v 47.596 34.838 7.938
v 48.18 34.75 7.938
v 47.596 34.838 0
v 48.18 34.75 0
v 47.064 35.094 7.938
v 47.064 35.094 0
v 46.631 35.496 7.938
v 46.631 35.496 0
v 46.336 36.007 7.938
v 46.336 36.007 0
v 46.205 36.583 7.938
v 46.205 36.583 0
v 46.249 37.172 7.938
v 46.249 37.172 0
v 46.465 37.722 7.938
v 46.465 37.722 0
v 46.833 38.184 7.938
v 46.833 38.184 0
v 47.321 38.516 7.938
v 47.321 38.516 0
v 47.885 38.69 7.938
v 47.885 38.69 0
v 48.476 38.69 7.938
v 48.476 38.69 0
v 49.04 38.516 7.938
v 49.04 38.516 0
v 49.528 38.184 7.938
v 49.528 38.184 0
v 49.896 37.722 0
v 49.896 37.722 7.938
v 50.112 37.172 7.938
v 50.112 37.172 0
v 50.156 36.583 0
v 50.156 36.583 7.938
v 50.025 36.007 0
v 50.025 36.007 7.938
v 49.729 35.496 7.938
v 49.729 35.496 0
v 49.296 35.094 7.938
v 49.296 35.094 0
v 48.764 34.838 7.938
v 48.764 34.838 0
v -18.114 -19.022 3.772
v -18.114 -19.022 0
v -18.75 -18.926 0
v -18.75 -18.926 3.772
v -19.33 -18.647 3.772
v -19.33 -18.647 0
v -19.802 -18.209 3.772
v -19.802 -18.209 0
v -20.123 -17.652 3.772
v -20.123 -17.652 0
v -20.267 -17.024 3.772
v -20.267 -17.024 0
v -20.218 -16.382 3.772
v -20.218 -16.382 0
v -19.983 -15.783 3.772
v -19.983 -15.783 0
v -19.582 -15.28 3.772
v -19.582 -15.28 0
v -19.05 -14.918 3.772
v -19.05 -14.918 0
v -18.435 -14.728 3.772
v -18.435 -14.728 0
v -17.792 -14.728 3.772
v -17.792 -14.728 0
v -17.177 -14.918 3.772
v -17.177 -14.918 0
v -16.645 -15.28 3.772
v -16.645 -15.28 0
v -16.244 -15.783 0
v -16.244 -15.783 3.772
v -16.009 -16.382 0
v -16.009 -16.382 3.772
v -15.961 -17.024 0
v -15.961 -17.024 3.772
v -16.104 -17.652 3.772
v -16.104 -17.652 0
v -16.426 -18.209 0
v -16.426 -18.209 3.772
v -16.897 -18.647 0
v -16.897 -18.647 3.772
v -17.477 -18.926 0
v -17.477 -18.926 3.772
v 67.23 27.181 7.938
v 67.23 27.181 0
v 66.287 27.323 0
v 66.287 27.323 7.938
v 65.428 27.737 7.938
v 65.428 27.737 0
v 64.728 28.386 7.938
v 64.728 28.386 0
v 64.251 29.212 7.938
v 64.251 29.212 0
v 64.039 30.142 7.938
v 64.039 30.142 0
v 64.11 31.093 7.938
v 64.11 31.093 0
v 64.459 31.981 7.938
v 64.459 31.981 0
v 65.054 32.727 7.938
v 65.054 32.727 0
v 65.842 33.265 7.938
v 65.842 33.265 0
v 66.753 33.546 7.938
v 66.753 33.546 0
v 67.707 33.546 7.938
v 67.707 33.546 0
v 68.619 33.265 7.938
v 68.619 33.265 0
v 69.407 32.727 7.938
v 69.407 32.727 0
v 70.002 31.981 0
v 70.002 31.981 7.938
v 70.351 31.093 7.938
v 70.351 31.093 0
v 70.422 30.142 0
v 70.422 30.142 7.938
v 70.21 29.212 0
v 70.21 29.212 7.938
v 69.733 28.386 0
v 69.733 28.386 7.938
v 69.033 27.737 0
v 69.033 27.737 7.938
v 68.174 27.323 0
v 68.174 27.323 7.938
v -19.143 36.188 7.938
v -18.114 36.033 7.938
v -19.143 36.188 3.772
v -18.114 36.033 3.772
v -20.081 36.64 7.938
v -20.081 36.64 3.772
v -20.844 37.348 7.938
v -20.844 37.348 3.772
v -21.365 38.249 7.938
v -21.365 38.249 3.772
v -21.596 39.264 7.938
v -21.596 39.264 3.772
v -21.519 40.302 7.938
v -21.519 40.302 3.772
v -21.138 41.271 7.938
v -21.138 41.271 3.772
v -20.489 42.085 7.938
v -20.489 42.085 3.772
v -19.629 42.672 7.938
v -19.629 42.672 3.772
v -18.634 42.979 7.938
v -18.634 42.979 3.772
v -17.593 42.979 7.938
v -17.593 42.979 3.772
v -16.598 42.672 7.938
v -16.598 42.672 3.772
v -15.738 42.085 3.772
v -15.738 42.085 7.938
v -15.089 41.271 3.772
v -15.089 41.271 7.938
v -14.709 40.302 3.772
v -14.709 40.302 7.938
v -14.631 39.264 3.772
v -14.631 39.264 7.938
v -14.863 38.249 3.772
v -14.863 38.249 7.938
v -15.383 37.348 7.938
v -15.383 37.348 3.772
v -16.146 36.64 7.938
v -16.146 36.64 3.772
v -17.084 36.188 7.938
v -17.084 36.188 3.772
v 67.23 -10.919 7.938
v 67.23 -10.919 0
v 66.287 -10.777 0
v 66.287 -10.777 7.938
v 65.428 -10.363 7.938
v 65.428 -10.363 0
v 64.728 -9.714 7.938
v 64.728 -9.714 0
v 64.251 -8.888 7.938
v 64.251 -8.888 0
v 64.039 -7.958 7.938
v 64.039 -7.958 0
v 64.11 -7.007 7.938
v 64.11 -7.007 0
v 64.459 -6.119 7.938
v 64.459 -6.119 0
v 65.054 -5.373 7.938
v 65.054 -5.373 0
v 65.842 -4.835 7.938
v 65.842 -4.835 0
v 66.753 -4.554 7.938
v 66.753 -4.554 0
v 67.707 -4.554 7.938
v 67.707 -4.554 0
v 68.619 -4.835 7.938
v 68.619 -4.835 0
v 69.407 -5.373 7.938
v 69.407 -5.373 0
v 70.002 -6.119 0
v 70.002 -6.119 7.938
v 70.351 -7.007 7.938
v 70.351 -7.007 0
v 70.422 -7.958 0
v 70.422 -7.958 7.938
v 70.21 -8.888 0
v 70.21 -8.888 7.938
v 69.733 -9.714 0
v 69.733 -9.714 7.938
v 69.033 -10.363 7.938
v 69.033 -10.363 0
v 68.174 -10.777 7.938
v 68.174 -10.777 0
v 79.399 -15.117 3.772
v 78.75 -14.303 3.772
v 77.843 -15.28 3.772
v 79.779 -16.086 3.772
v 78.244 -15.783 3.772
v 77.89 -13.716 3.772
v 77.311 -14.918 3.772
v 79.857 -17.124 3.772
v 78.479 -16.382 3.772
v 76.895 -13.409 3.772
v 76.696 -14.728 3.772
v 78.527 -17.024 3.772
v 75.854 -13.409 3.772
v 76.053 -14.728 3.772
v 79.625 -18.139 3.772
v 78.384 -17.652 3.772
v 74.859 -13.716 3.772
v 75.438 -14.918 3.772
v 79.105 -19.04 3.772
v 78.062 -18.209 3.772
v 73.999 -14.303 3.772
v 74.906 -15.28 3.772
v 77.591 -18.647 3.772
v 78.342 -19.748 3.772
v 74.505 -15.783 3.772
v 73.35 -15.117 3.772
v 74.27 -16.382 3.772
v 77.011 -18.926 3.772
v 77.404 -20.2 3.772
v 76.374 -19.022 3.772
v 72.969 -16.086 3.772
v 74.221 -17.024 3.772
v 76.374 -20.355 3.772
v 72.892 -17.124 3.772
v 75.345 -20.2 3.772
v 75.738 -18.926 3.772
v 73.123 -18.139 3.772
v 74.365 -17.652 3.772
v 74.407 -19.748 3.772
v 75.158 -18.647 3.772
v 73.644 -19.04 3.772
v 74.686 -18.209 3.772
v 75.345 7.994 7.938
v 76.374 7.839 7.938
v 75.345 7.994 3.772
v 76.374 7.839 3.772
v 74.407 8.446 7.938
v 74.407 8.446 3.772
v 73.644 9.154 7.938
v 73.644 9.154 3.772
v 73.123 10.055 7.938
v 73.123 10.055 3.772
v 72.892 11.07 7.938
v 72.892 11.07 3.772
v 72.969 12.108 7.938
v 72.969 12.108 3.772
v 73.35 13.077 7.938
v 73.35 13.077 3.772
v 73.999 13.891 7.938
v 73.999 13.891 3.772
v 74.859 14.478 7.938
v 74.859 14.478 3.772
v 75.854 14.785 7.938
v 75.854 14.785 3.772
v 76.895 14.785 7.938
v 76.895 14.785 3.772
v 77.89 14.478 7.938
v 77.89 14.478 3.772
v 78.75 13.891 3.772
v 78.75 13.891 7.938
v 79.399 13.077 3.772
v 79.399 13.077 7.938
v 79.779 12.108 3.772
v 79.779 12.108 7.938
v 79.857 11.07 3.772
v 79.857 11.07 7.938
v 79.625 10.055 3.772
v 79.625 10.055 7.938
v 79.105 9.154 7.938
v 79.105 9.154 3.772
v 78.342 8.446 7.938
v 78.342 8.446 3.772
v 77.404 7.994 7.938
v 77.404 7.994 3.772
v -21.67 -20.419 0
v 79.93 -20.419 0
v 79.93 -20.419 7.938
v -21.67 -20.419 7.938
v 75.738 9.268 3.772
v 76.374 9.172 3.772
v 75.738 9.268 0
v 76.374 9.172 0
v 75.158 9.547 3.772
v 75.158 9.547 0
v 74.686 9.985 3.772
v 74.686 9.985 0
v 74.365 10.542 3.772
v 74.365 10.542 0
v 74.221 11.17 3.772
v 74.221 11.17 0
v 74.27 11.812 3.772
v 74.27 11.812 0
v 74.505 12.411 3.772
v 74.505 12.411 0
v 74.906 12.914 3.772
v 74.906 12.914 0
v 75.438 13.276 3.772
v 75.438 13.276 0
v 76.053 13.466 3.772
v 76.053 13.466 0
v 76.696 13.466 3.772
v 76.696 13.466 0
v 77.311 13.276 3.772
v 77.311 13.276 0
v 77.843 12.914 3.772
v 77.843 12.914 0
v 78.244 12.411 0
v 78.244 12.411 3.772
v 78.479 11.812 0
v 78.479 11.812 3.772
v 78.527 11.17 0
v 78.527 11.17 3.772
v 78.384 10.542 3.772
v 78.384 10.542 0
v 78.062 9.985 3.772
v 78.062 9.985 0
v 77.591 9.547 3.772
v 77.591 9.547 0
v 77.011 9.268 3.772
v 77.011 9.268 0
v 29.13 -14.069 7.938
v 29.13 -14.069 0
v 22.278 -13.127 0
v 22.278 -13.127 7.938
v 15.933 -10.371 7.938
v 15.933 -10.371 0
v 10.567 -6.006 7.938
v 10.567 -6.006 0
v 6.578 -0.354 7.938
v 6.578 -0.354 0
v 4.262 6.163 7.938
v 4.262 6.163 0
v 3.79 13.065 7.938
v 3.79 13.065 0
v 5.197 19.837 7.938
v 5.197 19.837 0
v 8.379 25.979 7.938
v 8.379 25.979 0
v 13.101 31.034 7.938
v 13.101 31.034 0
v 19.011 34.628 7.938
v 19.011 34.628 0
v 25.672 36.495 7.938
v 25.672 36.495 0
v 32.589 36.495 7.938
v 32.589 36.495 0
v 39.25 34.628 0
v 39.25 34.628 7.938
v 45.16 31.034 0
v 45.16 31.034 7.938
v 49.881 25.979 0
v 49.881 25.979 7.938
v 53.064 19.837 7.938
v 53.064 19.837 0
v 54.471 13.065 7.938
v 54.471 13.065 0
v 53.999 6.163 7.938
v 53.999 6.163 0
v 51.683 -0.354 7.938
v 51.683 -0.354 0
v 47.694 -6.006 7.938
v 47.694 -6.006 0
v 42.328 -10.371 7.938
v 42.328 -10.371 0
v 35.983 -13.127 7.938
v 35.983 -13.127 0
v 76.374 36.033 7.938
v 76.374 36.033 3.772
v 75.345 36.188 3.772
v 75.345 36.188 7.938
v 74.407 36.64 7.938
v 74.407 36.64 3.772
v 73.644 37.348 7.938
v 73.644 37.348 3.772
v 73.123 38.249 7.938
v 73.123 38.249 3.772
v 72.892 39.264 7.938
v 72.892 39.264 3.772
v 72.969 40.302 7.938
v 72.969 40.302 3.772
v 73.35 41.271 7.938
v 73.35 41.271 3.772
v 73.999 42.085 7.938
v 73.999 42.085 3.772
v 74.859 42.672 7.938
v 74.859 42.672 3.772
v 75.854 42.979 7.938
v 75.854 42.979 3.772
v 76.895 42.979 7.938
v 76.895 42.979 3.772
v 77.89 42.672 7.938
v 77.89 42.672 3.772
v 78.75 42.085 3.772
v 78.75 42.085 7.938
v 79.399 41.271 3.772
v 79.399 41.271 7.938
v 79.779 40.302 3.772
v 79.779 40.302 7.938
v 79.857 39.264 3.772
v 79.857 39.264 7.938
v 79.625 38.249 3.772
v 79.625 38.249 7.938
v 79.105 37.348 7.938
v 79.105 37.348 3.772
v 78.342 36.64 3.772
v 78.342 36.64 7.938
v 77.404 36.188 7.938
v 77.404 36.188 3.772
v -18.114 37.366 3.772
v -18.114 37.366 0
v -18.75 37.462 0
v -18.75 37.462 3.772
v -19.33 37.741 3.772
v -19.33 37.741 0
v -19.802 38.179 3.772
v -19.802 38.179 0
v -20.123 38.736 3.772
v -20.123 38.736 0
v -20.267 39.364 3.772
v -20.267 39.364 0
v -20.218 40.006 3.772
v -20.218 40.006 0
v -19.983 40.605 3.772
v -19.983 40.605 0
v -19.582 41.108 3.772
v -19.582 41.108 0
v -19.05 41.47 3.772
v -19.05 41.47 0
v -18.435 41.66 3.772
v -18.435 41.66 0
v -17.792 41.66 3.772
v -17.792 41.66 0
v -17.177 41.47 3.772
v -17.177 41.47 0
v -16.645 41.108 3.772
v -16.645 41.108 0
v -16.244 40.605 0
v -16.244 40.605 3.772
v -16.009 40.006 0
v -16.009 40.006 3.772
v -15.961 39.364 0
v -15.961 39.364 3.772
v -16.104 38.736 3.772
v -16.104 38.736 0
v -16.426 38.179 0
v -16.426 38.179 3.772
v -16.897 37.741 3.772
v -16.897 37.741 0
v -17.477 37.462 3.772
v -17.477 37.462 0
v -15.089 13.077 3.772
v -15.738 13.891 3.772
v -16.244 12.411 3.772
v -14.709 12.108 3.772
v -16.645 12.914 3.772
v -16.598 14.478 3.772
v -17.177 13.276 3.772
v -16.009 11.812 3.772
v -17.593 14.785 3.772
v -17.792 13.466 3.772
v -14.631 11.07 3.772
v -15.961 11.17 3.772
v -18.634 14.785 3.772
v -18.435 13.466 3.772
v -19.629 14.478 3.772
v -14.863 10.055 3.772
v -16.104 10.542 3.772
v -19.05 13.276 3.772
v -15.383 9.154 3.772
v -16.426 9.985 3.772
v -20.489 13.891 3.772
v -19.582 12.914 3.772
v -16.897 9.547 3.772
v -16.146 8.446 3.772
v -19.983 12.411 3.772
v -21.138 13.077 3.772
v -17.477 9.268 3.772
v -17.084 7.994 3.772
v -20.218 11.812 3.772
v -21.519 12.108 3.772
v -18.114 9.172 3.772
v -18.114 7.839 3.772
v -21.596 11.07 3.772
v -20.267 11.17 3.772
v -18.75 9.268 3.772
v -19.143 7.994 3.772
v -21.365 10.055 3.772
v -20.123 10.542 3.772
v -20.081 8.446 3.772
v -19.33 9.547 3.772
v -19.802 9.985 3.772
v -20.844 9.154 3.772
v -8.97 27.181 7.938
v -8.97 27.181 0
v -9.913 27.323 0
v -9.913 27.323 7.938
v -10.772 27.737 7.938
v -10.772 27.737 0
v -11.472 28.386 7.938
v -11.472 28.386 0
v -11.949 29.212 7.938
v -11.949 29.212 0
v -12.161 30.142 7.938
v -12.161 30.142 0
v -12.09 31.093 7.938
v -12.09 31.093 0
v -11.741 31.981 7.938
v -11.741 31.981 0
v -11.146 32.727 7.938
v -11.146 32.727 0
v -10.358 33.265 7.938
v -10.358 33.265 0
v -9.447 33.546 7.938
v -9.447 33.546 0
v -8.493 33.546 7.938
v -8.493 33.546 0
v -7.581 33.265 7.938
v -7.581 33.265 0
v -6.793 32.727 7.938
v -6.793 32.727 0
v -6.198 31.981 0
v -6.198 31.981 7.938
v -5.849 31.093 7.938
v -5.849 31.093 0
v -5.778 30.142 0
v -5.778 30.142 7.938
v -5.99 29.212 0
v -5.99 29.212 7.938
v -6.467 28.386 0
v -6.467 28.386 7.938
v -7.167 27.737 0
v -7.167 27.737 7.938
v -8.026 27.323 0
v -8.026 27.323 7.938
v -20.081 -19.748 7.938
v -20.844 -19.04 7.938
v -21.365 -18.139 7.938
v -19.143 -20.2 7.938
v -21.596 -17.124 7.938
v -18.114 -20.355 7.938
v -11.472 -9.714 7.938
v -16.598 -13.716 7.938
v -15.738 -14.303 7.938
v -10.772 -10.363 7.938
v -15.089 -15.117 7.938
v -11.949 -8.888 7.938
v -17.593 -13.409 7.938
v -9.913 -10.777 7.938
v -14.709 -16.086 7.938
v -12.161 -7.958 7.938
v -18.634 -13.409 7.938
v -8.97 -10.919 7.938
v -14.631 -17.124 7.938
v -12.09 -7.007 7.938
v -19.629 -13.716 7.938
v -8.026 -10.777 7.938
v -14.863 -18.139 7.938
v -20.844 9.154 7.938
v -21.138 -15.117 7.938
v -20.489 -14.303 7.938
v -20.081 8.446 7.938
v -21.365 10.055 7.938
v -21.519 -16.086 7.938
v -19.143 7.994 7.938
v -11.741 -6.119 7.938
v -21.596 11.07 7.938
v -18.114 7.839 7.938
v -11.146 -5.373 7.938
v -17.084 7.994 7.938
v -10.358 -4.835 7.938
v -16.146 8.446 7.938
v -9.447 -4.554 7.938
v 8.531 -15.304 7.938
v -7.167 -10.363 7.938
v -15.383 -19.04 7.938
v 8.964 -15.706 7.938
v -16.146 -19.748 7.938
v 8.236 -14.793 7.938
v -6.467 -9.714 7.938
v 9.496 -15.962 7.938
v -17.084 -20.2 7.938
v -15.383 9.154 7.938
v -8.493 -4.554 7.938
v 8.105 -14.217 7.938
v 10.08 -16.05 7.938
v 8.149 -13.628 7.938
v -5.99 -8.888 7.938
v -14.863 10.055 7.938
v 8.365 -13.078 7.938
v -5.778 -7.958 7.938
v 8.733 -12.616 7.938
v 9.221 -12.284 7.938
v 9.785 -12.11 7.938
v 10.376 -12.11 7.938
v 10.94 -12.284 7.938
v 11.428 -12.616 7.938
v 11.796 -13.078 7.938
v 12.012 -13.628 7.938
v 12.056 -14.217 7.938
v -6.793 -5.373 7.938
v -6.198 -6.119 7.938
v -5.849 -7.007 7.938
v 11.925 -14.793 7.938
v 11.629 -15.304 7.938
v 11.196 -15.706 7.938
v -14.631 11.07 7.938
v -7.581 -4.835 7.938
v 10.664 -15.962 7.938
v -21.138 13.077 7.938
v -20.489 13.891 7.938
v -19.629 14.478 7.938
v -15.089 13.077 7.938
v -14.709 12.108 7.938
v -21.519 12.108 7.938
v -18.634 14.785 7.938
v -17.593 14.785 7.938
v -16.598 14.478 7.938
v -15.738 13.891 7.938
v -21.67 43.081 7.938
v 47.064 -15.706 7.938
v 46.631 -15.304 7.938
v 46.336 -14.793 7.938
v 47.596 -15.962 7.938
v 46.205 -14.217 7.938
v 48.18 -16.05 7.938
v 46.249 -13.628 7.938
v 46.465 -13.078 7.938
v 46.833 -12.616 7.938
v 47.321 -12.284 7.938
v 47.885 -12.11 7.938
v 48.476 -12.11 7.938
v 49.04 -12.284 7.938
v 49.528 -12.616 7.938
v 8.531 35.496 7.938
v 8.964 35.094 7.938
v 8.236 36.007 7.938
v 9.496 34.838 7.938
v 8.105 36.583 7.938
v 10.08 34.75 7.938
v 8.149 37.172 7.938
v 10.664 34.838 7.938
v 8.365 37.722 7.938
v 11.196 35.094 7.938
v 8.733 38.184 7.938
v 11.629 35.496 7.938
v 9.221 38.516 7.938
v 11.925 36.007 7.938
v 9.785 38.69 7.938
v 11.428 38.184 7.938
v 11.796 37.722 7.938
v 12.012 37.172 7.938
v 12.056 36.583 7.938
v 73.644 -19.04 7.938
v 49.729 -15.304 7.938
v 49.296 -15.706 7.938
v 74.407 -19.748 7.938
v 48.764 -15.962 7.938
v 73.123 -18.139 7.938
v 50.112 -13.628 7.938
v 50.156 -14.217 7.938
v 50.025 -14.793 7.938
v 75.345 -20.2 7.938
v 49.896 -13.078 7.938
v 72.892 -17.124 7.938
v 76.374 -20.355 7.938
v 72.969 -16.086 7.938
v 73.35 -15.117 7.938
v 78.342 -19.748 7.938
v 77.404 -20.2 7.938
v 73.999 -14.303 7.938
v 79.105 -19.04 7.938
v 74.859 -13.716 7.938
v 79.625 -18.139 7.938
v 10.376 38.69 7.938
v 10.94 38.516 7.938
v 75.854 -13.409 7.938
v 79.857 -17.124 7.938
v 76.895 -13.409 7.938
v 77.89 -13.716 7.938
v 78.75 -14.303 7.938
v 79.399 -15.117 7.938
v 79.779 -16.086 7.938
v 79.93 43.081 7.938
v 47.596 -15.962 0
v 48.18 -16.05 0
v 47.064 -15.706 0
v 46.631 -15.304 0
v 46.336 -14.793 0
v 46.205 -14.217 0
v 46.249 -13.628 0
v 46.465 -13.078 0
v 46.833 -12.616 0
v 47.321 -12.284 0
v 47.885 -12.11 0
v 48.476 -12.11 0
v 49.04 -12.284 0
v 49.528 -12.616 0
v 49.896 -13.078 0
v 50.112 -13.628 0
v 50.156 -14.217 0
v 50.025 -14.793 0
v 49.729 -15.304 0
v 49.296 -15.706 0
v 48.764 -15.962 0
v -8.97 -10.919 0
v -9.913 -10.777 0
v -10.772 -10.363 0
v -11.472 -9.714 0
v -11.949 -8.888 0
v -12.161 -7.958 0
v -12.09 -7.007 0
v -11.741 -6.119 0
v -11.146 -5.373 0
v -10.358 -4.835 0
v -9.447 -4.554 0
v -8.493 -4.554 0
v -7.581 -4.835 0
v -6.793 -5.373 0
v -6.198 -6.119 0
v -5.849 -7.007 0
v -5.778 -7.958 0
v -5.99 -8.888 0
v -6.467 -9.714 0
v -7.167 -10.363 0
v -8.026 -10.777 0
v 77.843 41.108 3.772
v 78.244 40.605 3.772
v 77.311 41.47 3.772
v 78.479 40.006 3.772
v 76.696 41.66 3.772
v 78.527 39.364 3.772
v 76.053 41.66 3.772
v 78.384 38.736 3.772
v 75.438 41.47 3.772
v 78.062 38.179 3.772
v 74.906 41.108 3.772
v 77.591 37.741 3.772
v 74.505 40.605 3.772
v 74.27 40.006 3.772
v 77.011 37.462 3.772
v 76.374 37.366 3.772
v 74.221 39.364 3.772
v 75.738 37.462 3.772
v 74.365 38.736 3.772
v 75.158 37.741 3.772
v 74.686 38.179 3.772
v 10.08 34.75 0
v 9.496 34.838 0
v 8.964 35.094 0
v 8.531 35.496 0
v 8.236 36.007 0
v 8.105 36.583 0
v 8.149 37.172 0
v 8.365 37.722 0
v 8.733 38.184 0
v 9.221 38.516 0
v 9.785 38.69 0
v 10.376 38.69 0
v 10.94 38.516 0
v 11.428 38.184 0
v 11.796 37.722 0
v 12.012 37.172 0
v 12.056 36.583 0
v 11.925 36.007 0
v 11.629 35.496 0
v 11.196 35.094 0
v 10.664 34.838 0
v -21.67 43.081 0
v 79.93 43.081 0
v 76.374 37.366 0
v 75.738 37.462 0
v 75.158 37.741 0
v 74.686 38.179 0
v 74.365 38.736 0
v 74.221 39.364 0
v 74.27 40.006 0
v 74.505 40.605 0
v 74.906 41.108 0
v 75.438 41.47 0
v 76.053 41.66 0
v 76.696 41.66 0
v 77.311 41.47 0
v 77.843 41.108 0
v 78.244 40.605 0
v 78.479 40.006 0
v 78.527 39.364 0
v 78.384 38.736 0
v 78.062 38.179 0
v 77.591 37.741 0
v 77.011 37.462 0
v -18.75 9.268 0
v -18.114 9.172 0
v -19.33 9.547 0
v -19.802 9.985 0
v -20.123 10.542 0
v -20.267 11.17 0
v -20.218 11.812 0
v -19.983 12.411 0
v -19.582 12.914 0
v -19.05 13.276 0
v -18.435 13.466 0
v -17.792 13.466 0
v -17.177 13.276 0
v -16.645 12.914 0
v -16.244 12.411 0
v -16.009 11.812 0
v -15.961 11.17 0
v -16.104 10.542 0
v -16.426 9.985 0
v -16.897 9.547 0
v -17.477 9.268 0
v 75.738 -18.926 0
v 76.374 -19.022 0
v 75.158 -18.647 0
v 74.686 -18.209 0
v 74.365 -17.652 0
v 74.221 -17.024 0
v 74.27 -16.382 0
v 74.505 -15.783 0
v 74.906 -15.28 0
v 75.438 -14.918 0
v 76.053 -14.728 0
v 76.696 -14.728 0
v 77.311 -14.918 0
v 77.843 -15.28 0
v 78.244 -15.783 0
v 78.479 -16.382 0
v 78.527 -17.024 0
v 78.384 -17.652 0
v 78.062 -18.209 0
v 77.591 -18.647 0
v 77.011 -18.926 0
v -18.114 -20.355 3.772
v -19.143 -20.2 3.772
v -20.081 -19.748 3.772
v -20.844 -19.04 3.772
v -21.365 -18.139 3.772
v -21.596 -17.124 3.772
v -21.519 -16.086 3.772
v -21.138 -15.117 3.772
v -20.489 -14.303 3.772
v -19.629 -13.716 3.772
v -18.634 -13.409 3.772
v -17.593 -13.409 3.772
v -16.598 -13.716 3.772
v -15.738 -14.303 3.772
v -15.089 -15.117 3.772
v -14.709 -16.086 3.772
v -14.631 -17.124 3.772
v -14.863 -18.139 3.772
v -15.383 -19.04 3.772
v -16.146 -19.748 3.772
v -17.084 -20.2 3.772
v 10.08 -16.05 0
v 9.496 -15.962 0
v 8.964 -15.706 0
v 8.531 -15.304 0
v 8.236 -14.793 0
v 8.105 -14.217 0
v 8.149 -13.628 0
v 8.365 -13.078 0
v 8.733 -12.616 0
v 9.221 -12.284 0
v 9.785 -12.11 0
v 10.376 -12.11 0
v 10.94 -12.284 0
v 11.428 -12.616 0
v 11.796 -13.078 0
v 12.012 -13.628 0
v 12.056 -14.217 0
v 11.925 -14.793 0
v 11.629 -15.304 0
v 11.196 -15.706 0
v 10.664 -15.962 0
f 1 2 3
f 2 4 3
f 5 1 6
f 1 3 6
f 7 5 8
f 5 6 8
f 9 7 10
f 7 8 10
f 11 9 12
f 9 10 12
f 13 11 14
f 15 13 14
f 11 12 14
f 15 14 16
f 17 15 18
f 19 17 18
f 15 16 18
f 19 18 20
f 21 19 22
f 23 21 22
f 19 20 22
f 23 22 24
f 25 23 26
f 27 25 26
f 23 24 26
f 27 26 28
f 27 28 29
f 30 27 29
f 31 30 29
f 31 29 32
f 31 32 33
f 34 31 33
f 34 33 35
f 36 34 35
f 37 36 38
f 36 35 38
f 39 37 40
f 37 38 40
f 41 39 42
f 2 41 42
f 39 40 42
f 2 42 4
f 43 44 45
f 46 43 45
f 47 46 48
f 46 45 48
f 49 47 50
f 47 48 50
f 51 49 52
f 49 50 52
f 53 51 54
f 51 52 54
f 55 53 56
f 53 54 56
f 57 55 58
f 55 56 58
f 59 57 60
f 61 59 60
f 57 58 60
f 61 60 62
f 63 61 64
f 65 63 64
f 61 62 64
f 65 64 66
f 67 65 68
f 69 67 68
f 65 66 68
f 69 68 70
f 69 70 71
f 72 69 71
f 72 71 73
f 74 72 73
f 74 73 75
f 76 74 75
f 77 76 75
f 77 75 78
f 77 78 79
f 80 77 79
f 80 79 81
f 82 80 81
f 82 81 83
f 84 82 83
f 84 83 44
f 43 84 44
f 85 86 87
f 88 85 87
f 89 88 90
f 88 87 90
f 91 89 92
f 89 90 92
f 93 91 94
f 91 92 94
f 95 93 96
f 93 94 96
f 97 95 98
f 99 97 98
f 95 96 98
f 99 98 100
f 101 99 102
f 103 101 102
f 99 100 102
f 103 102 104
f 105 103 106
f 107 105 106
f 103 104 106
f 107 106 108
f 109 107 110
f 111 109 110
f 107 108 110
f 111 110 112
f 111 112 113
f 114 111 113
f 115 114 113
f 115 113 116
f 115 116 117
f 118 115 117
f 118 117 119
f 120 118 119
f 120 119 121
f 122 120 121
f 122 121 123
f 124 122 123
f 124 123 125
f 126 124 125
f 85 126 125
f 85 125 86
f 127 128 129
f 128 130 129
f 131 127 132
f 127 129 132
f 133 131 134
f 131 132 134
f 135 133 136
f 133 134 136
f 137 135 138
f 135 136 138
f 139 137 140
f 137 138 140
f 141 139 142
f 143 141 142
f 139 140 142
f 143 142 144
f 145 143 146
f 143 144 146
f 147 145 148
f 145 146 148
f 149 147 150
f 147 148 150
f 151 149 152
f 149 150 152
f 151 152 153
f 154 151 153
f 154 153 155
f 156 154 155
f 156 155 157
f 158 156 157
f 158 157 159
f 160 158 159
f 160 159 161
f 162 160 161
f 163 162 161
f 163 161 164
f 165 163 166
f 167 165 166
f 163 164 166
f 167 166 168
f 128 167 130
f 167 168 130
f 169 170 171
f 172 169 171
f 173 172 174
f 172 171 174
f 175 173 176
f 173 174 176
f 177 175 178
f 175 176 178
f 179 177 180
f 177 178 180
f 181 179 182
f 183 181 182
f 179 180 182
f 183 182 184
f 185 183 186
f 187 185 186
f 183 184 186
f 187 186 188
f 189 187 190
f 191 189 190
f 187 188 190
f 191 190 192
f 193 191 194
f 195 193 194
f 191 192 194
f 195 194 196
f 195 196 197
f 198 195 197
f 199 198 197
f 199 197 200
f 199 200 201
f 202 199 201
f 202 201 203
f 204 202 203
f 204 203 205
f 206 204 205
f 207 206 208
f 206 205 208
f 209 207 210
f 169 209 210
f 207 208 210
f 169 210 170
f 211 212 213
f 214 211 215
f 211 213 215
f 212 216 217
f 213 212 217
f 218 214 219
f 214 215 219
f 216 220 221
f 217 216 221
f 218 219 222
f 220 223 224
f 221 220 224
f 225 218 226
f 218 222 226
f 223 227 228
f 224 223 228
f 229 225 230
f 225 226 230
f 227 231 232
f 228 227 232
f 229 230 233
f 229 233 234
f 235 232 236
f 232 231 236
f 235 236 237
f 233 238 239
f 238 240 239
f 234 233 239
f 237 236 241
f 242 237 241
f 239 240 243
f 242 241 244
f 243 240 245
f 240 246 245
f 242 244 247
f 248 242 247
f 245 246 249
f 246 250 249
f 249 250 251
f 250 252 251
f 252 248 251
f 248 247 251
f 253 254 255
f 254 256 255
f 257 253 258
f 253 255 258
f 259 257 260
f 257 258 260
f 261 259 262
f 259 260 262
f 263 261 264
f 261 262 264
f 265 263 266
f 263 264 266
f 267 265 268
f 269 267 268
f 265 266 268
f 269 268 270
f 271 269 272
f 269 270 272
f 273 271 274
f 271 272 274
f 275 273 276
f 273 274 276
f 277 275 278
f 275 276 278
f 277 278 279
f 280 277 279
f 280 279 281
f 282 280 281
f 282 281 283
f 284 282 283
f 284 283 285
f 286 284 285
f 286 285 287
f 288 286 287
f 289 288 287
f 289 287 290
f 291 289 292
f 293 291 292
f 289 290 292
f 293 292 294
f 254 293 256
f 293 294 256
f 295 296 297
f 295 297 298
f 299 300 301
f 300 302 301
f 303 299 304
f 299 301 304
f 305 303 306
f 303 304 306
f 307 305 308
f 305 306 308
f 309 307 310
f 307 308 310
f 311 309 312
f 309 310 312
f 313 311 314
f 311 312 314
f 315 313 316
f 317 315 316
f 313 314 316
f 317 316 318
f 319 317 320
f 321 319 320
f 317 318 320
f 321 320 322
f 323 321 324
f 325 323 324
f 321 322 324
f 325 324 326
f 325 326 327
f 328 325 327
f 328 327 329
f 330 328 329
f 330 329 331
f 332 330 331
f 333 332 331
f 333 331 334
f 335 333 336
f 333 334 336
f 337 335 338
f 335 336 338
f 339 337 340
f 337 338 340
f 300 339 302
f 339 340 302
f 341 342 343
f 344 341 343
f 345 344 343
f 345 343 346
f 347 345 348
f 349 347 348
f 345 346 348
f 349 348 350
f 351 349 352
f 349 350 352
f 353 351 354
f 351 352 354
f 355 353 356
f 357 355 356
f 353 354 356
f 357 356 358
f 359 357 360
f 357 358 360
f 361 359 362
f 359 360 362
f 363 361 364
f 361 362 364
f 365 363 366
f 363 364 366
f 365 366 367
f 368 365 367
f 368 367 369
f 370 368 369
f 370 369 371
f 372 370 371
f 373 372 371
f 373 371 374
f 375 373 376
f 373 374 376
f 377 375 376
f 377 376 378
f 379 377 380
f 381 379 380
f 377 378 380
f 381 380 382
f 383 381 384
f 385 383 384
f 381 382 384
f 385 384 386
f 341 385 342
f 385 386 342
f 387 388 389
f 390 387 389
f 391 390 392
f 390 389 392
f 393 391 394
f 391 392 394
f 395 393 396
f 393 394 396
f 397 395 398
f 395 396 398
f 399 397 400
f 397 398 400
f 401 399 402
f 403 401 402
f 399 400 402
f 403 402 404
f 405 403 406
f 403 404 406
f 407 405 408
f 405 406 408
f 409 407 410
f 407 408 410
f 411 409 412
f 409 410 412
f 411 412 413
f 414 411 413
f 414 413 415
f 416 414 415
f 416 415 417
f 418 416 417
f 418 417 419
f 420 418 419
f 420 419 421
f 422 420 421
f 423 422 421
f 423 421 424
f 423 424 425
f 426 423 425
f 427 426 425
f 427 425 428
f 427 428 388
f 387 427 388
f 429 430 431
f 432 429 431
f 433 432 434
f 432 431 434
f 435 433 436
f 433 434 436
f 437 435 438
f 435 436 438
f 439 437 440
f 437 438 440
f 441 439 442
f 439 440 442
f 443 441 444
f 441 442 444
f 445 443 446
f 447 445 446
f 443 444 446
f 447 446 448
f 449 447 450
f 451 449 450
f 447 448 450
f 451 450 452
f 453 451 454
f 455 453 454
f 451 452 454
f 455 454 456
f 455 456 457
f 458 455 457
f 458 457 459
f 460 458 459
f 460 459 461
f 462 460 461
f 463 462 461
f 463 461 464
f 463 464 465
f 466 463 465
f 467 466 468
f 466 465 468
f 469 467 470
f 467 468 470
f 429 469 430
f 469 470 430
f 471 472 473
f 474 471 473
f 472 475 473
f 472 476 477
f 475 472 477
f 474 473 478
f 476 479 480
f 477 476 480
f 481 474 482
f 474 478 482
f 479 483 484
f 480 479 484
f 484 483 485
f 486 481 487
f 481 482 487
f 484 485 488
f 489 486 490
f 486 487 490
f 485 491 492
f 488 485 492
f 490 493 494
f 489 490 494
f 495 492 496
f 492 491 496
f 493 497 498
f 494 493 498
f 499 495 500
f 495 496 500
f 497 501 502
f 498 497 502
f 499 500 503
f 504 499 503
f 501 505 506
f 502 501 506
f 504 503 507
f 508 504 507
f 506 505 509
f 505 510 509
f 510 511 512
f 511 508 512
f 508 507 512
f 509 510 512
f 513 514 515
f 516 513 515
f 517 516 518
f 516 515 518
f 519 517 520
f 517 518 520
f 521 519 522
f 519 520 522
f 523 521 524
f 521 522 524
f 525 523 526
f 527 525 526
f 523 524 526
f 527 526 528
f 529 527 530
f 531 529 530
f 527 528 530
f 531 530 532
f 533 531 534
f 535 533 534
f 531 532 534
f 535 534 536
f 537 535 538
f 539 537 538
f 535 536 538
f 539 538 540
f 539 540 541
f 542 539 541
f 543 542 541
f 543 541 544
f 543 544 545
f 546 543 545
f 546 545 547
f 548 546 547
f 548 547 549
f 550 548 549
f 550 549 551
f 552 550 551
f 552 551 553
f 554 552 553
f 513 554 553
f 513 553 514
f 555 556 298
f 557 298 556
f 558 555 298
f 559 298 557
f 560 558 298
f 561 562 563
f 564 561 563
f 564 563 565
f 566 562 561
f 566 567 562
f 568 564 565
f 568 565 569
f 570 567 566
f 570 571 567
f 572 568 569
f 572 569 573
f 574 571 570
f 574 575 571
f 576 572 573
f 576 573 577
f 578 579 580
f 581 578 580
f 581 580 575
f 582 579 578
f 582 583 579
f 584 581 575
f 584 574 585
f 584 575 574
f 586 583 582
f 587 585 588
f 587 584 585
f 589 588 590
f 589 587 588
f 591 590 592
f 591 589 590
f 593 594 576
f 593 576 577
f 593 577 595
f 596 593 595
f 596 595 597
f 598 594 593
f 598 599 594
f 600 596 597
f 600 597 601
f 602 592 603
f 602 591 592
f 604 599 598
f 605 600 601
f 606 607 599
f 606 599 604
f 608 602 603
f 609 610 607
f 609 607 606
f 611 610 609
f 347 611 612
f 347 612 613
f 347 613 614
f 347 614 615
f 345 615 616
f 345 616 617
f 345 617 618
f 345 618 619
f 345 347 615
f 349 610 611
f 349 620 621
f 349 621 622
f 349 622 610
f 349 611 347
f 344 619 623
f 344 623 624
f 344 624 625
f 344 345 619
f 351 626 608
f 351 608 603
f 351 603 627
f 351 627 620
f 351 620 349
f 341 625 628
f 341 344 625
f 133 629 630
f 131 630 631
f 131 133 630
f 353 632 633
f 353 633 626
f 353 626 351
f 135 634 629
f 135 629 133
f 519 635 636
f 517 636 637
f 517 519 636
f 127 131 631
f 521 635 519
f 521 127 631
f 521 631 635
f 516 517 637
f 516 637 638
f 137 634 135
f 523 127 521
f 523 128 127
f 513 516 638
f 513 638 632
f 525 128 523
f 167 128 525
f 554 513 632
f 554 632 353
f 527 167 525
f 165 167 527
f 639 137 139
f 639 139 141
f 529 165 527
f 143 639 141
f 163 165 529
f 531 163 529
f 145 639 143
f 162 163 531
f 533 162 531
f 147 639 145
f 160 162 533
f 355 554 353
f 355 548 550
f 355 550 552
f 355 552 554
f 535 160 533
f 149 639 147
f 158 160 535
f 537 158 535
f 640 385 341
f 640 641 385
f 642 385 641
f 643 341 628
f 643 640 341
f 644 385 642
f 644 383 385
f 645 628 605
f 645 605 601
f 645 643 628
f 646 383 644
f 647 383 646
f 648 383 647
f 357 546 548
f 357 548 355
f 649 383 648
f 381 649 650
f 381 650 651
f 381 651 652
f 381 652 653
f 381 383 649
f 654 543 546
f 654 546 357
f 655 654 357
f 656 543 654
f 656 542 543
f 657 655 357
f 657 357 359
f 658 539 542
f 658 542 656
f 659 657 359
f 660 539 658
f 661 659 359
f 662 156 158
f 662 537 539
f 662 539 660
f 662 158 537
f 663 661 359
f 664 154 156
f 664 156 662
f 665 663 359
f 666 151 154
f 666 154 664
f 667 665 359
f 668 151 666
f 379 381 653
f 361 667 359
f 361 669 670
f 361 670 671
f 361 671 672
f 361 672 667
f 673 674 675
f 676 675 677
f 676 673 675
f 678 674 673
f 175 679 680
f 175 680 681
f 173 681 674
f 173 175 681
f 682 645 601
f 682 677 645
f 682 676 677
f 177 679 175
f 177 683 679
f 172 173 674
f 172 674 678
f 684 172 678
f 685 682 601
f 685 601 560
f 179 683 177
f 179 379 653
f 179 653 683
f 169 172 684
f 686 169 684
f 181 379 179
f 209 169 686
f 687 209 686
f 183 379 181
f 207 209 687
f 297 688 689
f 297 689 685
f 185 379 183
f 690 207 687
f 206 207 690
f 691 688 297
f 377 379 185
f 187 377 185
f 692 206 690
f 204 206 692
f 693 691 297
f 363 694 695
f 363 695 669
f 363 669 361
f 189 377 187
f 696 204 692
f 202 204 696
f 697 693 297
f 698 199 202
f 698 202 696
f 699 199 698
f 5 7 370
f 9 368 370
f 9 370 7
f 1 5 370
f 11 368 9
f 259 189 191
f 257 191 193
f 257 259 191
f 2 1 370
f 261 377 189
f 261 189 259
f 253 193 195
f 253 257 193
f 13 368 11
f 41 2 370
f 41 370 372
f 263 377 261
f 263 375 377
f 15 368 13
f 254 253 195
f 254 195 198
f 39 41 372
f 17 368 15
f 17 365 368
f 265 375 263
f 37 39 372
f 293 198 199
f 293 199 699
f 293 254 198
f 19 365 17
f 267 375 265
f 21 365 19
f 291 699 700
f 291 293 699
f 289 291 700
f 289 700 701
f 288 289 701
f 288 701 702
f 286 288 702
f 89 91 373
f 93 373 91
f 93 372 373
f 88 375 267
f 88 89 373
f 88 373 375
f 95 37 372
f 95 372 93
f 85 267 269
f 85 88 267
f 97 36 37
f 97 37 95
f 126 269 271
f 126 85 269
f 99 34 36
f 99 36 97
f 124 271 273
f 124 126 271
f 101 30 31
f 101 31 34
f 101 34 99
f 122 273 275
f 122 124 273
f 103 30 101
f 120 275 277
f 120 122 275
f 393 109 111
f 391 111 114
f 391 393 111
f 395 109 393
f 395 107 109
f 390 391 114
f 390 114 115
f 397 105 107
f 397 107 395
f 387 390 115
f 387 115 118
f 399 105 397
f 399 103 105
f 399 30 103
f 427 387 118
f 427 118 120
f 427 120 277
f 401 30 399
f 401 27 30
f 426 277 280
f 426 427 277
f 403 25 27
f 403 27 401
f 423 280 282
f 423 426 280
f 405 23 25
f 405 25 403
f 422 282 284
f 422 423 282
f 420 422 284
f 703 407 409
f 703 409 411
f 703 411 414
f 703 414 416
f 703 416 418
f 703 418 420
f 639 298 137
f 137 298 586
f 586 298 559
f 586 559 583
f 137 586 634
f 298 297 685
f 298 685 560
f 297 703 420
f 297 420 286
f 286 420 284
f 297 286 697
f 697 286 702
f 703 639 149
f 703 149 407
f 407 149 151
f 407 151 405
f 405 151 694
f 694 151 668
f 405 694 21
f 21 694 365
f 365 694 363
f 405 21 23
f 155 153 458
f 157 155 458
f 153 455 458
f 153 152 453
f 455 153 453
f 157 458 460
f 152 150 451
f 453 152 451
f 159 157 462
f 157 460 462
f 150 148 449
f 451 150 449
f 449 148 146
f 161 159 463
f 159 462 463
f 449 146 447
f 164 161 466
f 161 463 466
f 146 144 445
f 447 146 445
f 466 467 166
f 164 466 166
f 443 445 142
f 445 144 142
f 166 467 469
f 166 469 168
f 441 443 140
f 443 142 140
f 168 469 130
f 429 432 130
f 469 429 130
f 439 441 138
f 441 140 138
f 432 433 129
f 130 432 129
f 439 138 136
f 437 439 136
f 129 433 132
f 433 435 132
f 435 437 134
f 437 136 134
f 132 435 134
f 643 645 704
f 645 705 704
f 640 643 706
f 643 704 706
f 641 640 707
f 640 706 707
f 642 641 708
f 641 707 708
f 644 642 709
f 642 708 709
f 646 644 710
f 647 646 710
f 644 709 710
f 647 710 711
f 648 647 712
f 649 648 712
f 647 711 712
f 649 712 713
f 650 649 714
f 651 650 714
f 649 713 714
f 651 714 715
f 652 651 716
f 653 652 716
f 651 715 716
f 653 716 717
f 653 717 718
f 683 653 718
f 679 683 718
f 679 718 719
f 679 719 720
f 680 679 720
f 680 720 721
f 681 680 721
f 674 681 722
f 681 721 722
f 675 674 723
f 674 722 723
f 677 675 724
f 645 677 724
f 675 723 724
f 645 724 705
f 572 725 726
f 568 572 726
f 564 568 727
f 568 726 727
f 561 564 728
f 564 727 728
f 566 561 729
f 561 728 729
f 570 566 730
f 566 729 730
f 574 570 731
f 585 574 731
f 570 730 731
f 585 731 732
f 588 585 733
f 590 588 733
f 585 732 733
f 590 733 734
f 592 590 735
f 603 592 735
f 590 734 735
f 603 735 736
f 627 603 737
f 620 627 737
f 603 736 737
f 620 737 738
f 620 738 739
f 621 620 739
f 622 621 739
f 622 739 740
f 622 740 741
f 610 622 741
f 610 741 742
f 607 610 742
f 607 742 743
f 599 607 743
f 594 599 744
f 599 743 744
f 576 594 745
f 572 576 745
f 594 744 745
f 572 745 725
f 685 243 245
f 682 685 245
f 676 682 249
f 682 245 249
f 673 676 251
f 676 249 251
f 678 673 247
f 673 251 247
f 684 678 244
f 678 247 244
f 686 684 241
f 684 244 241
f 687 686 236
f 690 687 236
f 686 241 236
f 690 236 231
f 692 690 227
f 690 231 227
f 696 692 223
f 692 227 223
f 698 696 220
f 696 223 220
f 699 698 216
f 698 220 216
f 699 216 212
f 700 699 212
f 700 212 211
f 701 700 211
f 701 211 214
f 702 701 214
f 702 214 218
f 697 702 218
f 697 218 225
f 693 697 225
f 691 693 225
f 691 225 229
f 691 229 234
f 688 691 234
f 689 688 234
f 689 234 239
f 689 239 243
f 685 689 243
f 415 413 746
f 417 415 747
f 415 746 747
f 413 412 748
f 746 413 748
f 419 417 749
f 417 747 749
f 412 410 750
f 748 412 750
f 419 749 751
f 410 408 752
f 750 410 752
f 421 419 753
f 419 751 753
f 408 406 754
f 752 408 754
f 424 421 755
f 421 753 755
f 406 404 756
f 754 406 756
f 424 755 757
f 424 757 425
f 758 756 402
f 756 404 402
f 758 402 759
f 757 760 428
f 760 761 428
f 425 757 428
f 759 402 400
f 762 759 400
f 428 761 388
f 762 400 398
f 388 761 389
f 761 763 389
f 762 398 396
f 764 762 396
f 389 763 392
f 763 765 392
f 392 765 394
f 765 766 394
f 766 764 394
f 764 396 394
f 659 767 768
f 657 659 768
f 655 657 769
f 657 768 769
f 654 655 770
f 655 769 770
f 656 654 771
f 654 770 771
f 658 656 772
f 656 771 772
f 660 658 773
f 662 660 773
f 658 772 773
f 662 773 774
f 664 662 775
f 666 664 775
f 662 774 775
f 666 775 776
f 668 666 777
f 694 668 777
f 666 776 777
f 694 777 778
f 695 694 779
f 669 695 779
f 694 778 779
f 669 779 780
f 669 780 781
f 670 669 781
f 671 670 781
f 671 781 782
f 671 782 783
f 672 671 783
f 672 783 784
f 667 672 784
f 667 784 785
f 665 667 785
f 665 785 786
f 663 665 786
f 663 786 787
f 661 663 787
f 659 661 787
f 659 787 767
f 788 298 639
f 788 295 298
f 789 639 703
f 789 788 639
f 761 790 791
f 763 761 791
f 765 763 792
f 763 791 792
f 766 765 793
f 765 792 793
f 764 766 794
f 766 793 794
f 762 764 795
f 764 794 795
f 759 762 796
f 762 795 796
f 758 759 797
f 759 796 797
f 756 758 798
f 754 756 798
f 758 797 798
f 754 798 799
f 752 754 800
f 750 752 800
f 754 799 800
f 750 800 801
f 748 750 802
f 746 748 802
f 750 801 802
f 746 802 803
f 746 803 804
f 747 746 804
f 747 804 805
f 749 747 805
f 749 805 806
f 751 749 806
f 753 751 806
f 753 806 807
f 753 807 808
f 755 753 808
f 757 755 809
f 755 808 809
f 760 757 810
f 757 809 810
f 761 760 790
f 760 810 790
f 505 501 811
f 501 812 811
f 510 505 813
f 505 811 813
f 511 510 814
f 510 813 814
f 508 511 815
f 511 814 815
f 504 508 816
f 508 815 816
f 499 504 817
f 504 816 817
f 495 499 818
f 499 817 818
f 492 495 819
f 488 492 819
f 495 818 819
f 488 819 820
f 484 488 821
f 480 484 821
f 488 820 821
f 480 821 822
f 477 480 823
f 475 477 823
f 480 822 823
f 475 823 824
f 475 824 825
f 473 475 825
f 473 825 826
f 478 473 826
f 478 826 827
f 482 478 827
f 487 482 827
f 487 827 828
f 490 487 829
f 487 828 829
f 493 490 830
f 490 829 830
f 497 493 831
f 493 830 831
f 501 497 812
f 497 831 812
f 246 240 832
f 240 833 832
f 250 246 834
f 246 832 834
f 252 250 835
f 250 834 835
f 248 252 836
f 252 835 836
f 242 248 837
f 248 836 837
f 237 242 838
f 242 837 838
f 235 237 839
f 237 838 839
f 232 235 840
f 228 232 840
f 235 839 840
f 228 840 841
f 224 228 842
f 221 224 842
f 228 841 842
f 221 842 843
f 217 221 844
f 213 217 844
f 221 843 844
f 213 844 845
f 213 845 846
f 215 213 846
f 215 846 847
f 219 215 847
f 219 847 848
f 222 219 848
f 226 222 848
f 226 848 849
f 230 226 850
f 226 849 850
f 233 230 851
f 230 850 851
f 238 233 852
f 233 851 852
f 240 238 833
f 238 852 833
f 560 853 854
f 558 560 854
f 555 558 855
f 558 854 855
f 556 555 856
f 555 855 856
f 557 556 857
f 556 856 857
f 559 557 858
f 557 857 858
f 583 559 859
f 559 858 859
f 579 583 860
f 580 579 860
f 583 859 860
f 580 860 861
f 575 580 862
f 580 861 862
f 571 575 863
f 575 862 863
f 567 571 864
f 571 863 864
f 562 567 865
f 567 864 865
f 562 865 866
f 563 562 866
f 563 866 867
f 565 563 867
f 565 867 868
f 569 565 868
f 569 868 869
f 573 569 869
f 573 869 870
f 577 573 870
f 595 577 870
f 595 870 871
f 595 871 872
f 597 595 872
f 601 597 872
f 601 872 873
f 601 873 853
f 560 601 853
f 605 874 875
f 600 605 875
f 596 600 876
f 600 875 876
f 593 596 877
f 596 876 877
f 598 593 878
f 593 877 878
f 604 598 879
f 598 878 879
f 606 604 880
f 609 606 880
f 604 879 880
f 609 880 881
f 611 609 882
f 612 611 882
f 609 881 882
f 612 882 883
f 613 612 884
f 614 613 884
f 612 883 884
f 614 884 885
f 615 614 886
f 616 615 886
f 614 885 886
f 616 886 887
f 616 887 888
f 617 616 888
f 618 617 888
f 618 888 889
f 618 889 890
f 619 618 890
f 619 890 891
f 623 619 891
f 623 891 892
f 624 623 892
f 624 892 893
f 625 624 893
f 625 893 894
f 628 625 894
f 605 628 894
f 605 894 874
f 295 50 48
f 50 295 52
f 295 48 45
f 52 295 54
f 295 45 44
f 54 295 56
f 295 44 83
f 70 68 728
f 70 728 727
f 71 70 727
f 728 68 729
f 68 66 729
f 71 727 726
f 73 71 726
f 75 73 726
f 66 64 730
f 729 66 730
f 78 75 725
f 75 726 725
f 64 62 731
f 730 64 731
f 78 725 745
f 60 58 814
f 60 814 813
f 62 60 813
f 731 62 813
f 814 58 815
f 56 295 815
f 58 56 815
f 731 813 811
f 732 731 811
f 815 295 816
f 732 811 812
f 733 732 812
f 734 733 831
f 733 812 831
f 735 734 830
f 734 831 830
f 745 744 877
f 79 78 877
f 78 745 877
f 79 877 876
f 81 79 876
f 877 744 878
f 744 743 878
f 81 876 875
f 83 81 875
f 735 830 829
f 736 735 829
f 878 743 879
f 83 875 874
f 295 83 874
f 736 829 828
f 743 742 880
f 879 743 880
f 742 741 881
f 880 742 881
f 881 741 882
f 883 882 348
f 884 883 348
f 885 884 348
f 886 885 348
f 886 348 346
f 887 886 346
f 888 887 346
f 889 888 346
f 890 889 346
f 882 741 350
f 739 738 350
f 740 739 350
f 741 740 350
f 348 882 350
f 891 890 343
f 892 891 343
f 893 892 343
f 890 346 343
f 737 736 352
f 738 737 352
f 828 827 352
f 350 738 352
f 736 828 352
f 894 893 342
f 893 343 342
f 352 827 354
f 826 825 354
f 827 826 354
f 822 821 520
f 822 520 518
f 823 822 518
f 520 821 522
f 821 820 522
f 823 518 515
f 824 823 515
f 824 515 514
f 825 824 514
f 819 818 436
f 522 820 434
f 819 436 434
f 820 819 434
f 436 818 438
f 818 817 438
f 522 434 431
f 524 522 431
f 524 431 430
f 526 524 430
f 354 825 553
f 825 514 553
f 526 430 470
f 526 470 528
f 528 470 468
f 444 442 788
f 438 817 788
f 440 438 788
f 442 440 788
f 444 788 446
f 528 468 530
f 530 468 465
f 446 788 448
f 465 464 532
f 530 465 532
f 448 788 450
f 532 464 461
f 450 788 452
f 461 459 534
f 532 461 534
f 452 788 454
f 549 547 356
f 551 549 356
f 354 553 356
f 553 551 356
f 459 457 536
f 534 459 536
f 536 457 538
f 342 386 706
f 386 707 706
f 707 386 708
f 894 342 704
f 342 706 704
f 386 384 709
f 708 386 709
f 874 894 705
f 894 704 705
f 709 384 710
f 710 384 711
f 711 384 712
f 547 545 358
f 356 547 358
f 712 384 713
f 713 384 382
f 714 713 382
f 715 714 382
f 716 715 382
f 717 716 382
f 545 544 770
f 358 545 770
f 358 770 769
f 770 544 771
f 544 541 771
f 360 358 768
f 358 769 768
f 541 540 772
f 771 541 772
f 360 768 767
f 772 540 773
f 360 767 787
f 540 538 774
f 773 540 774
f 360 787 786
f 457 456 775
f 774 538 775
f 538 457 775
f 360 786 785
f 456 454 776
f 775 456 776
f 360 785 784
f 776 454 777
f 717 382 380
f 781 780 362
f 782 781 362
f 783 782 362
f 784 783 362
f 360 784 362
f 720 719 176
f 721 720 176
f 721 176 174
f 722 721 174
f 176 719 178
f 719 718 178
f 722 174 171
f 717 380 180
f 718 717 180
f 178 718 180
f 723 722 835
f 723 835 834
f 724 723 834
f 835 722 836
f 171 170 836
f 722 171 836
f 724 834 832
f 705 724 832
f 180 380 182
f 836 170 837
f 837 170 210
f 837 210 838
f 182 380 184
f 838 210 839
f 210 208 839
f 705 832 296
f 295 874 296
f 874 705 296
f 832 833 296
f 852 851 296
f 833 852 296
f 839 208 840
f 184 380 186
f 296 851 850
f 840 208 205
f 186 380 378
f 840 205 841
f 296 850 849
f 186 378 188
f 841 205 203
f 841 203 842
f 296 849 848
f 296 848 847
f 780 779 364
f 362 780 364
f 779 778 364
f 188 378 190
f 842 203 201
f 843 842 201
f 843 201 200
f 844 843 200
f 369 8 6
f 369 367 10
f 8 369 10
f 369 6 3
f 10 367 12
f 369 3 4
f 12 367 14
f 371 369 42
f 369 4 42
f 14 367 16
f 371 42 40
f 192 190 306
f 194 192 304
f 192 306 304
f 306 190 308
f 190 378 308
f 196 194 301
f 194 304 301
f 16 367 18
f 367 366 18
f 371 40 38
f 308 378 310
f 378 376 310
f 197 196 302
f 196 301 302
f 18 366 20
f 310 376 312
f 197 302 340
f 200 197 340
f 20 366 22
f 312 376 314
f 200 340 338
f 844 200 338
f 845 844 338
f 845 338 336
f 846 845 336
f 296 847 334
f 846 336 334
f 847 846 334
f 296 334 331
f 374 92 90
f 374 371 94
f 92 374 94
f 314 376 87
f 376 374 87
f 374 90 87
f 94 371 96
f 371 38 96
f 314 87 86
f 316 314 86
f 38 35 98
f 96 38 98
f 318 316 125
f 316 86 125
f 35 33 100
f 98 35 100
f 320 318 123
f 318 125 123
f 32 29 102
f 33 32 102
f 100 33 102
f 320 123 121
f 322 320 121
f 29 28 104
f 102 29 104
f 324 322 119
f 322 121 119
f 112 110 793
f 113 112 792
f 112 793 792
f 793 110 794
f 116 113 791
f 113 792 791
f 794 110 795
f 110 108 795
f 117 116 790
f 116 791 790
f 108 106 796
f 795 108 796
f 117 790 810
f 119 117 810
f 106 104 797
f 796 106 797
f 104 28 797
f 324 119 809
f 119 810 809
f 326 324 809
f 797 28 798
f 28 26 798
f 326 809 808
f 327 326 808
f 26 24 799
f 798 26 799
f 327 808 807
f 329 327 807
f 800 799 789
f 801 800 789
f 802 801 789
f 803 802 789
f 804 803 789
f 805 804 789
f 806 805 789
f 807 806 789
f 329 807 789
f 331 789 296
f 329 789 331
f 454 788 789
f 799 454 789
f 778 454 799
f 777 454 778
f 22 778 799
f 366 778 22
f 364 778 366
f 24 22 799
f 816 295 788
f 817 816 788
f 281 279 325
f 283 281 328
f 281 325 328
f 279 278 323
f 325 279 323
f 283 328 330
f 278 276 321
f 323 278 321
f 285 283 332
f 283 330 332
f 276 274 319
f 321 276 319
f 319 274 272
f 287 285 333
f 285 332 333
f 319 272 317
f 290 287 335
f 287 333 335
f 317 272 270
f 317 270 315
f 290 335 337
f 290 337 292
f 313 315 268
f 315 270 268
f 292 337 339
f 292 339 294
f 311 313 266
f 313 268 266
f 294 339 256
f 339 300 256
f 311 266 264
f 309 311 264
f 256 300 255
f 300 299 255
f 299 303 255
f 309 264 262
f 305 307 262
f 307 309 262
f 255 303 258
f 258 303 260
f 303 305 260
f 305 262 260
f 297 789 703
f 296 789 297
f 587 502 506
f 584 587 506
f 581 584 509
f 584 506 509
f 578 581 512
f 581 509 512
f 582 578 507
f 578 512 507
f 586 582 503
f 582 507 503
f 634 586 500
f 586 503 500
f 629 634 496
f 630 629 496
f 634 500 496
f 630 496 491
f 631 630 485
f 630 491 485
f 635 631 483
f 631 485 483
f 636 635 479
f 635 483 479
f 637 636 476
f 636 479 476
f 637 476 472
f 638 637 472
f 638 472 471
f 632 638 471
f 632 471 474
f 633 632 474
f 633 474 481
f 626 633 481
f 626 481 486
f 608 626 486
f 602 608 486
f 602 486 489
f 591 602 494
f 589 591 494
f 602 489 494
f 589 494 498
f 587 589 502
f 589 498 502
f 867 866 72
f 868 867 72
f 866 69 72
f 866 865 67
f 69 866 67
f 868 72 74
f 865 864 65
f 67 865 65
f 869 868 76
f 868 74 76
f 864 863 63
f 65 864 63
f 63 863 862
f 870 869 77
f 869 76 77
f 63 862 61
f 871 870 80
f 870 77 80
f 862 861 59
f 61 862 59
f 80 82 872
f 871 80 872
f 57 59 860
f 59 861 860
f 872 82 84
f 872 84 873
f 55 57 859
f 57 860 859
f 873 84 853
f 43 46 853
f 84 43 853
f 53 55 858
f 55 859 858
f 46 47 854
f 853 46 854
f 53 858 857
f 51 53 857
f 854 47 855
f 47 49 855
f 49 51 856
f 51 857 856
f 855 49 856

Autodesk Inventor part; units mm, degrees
ref_plane "YZ Plane" through (0, 0, 0) normal (1, 0, 0) x (0, 1, 0)
ref_plane "XZ Plane" through (0, 0, 0) normal (0, 1, 0) x (-1, 0, 0)
ref_plane "XY Plane" through (0, 0, 0) normal (0, 0, 1) x (1, 0, 0)
sketch "Sketch1" plane through (0, 0, 0) normal (0, 0, 1) x (1, 0, 0)
  line L0 (-21.6696, 43.0812) -> (79.9304, 43.0812)
  line L1 (79.9304, 43.0812) -> (79.9304, -20.4188)
  line L2 (79.9304, -20.4188) -> (-21.6696, -20.4188)
  line L3 (-21.6696, -20.4188) -> (-21.6696, 43.0812)
  point P0 (0, 0)
  dimension "d0" = 101.6
  dimension "d1" = 63.5
extrude "Extrusion1" add sketch "Sketch1" along normal blind 7.9375
sketch "Sketch3" plane through (0, 0, 7.9375) normal (0, 0, 1) x (1, 0, 0)
  line L0 (-21.6696, 43.0812) -> (79.9304, 43.0812) projected
  line L1 (-21.6696, -20.4188) -> (-21.6696, 43.0812) projected
  point P0 (0, 0)
  point P1 (29.1304, 11.3312)
  dimension "d15" = 31.75
  dimension "d16" = 50.8
hole "Hole2" at (29.1304, 11.3312, 7.9375) direction (0, 0, -1) diameter 50.8 end through all
sketch "Sketch4" plane through (0, 0, 7.9375) normal (0, 0, 1) x (1, 0, 0)
  line L0 (-21.6696, -20.4188) -> (-21.6696, 43.0812) projected
  line L1 (79.9304, -20.4188) -> (-21.6696, -20.4188) projected
  point P0 (0, 0)
  point P1 (10.0804, 36.7312)
  point P2 (10.0804, -14.0688)
  point P3 (48.1804, 36.7312)
  point P4 (48.1804, -14.0688)
  dimension "d24" = 50.8
  dimension "d25" = 6.35
  dimension "d26" = 38.1
  dimension "d27" = 31.75
  dimension "d28" = 31.75
hole "Hole3" at (10.0804, 36.7312, 7.9375) at (10.0804, -14.0688, 7.9375) at (48.1804, 36.7312, 7.9375) at (48.1804, -14.0688, 7.9375) direction (0, 0, -1) diameter 3.9624 end through all thread size "10-32 UNF" class "2B" standard "ANSI Unified Screw Threads"
sketch "Sketch5" plane through (0, 0, 7.9375) normal (0, 0, 1) x (1, 0, 0)
  line L0 (79.9304, 43.0812) -> (79.9304, -20.4188) projected
  line L1 (-21.6696, 43.0812) -> (79.9304, 43.0812) projected
  line L2 (-21.6696, -20.4188) -> (-21.6696, 43.0812) projected
  line L3 (79.9304, -20.4188) -> (-21.6696, -20.4188) projected
  point P0 (0, 0)
  point P1 (-18.1136, 39.5252)
  point P2 (-18.1136, -16.8628)
  point P3 (76.3744, -16.8628)
  point P4 (76.3744, 39.5252)
  point P5 (-18.1136, 11.3312)
  point P6 (76.3744, 11.3312)
  dimension "d36" = 3.556
  dimension "d37" = 3.556
  dimension "d38" = 3.556
  dimension "d39" = 3.556
  dimension "d47" = 3.556
  dimension "d48" = 3.556
  dimension "d49" = 3.556
  dimension "d50" = 3.556
  dimension "d51" = 3.556
  dimension "d52" = 3.556
  dimension "d66" = 94.488
  dimension "d67" = 56.388
hole "Hole4" at (-18.1136, 39.5252, 7.9375) at (-18.1136, -16.8628, 7.9375) at (76.3744, -16.8628, 7.9375) at (76.3744, 39.5252, 7.9375) at (-18.1136, 11.3312, 7.9375) at (76.3744, 11.3312, 7.9375) direction (0, 0, -1) diameter 4.318 end through all counterbore diameter 6.985 counterbore depth 4.1656
sketch "Sketch6" plane through (0, 0, 7.9375) normal (0, 0, 1) x (1, 0, 0)
  line L0 (79.9304, 43.0812) -> (79.9304, -20.4188) projected
  line L1 (-21.6696, 43.0812) -> (79.9304, 43.0812) projected
  line L2 (-21.6696, -20.4188) -> (-21.6696, 43.0812) projected
  line L3 (79.9304, -20.4188) -> (-21.6696, -20.4188) projected
  point P0 (0, 0)
  point P1 (-8.9696, 30.3812)
  point P2 (-8.9696, -7.7188)
  point P3 (67.2304, 30.3812)
  point P4 (67.2304, -7.7188)
  dimension "d53" = 12.7
  dimension "d54" = 12.7
  dimension "d55" = 12.7
  dimension "d56" = 12.7
  dimension "d64" = 12.7
  dimension "d65" = 12.7
hole "Hole5" at (-8.9696, 30.3812, 7.9375) at (-8.9696, -7.7188, 7.9375) at (67.2304, 30.3812, 7.9375) at (67.2304, -7.7188, 7.9375) direction (0, 0, -1) diameter 6.4008 end through all thread size "5/16-18 UNC" class "2B" standard "ANSI Unified Screw Threads"
properties part number "JF-AT-JC0014" material "Aluminum-6061 (Anodized Black)"
